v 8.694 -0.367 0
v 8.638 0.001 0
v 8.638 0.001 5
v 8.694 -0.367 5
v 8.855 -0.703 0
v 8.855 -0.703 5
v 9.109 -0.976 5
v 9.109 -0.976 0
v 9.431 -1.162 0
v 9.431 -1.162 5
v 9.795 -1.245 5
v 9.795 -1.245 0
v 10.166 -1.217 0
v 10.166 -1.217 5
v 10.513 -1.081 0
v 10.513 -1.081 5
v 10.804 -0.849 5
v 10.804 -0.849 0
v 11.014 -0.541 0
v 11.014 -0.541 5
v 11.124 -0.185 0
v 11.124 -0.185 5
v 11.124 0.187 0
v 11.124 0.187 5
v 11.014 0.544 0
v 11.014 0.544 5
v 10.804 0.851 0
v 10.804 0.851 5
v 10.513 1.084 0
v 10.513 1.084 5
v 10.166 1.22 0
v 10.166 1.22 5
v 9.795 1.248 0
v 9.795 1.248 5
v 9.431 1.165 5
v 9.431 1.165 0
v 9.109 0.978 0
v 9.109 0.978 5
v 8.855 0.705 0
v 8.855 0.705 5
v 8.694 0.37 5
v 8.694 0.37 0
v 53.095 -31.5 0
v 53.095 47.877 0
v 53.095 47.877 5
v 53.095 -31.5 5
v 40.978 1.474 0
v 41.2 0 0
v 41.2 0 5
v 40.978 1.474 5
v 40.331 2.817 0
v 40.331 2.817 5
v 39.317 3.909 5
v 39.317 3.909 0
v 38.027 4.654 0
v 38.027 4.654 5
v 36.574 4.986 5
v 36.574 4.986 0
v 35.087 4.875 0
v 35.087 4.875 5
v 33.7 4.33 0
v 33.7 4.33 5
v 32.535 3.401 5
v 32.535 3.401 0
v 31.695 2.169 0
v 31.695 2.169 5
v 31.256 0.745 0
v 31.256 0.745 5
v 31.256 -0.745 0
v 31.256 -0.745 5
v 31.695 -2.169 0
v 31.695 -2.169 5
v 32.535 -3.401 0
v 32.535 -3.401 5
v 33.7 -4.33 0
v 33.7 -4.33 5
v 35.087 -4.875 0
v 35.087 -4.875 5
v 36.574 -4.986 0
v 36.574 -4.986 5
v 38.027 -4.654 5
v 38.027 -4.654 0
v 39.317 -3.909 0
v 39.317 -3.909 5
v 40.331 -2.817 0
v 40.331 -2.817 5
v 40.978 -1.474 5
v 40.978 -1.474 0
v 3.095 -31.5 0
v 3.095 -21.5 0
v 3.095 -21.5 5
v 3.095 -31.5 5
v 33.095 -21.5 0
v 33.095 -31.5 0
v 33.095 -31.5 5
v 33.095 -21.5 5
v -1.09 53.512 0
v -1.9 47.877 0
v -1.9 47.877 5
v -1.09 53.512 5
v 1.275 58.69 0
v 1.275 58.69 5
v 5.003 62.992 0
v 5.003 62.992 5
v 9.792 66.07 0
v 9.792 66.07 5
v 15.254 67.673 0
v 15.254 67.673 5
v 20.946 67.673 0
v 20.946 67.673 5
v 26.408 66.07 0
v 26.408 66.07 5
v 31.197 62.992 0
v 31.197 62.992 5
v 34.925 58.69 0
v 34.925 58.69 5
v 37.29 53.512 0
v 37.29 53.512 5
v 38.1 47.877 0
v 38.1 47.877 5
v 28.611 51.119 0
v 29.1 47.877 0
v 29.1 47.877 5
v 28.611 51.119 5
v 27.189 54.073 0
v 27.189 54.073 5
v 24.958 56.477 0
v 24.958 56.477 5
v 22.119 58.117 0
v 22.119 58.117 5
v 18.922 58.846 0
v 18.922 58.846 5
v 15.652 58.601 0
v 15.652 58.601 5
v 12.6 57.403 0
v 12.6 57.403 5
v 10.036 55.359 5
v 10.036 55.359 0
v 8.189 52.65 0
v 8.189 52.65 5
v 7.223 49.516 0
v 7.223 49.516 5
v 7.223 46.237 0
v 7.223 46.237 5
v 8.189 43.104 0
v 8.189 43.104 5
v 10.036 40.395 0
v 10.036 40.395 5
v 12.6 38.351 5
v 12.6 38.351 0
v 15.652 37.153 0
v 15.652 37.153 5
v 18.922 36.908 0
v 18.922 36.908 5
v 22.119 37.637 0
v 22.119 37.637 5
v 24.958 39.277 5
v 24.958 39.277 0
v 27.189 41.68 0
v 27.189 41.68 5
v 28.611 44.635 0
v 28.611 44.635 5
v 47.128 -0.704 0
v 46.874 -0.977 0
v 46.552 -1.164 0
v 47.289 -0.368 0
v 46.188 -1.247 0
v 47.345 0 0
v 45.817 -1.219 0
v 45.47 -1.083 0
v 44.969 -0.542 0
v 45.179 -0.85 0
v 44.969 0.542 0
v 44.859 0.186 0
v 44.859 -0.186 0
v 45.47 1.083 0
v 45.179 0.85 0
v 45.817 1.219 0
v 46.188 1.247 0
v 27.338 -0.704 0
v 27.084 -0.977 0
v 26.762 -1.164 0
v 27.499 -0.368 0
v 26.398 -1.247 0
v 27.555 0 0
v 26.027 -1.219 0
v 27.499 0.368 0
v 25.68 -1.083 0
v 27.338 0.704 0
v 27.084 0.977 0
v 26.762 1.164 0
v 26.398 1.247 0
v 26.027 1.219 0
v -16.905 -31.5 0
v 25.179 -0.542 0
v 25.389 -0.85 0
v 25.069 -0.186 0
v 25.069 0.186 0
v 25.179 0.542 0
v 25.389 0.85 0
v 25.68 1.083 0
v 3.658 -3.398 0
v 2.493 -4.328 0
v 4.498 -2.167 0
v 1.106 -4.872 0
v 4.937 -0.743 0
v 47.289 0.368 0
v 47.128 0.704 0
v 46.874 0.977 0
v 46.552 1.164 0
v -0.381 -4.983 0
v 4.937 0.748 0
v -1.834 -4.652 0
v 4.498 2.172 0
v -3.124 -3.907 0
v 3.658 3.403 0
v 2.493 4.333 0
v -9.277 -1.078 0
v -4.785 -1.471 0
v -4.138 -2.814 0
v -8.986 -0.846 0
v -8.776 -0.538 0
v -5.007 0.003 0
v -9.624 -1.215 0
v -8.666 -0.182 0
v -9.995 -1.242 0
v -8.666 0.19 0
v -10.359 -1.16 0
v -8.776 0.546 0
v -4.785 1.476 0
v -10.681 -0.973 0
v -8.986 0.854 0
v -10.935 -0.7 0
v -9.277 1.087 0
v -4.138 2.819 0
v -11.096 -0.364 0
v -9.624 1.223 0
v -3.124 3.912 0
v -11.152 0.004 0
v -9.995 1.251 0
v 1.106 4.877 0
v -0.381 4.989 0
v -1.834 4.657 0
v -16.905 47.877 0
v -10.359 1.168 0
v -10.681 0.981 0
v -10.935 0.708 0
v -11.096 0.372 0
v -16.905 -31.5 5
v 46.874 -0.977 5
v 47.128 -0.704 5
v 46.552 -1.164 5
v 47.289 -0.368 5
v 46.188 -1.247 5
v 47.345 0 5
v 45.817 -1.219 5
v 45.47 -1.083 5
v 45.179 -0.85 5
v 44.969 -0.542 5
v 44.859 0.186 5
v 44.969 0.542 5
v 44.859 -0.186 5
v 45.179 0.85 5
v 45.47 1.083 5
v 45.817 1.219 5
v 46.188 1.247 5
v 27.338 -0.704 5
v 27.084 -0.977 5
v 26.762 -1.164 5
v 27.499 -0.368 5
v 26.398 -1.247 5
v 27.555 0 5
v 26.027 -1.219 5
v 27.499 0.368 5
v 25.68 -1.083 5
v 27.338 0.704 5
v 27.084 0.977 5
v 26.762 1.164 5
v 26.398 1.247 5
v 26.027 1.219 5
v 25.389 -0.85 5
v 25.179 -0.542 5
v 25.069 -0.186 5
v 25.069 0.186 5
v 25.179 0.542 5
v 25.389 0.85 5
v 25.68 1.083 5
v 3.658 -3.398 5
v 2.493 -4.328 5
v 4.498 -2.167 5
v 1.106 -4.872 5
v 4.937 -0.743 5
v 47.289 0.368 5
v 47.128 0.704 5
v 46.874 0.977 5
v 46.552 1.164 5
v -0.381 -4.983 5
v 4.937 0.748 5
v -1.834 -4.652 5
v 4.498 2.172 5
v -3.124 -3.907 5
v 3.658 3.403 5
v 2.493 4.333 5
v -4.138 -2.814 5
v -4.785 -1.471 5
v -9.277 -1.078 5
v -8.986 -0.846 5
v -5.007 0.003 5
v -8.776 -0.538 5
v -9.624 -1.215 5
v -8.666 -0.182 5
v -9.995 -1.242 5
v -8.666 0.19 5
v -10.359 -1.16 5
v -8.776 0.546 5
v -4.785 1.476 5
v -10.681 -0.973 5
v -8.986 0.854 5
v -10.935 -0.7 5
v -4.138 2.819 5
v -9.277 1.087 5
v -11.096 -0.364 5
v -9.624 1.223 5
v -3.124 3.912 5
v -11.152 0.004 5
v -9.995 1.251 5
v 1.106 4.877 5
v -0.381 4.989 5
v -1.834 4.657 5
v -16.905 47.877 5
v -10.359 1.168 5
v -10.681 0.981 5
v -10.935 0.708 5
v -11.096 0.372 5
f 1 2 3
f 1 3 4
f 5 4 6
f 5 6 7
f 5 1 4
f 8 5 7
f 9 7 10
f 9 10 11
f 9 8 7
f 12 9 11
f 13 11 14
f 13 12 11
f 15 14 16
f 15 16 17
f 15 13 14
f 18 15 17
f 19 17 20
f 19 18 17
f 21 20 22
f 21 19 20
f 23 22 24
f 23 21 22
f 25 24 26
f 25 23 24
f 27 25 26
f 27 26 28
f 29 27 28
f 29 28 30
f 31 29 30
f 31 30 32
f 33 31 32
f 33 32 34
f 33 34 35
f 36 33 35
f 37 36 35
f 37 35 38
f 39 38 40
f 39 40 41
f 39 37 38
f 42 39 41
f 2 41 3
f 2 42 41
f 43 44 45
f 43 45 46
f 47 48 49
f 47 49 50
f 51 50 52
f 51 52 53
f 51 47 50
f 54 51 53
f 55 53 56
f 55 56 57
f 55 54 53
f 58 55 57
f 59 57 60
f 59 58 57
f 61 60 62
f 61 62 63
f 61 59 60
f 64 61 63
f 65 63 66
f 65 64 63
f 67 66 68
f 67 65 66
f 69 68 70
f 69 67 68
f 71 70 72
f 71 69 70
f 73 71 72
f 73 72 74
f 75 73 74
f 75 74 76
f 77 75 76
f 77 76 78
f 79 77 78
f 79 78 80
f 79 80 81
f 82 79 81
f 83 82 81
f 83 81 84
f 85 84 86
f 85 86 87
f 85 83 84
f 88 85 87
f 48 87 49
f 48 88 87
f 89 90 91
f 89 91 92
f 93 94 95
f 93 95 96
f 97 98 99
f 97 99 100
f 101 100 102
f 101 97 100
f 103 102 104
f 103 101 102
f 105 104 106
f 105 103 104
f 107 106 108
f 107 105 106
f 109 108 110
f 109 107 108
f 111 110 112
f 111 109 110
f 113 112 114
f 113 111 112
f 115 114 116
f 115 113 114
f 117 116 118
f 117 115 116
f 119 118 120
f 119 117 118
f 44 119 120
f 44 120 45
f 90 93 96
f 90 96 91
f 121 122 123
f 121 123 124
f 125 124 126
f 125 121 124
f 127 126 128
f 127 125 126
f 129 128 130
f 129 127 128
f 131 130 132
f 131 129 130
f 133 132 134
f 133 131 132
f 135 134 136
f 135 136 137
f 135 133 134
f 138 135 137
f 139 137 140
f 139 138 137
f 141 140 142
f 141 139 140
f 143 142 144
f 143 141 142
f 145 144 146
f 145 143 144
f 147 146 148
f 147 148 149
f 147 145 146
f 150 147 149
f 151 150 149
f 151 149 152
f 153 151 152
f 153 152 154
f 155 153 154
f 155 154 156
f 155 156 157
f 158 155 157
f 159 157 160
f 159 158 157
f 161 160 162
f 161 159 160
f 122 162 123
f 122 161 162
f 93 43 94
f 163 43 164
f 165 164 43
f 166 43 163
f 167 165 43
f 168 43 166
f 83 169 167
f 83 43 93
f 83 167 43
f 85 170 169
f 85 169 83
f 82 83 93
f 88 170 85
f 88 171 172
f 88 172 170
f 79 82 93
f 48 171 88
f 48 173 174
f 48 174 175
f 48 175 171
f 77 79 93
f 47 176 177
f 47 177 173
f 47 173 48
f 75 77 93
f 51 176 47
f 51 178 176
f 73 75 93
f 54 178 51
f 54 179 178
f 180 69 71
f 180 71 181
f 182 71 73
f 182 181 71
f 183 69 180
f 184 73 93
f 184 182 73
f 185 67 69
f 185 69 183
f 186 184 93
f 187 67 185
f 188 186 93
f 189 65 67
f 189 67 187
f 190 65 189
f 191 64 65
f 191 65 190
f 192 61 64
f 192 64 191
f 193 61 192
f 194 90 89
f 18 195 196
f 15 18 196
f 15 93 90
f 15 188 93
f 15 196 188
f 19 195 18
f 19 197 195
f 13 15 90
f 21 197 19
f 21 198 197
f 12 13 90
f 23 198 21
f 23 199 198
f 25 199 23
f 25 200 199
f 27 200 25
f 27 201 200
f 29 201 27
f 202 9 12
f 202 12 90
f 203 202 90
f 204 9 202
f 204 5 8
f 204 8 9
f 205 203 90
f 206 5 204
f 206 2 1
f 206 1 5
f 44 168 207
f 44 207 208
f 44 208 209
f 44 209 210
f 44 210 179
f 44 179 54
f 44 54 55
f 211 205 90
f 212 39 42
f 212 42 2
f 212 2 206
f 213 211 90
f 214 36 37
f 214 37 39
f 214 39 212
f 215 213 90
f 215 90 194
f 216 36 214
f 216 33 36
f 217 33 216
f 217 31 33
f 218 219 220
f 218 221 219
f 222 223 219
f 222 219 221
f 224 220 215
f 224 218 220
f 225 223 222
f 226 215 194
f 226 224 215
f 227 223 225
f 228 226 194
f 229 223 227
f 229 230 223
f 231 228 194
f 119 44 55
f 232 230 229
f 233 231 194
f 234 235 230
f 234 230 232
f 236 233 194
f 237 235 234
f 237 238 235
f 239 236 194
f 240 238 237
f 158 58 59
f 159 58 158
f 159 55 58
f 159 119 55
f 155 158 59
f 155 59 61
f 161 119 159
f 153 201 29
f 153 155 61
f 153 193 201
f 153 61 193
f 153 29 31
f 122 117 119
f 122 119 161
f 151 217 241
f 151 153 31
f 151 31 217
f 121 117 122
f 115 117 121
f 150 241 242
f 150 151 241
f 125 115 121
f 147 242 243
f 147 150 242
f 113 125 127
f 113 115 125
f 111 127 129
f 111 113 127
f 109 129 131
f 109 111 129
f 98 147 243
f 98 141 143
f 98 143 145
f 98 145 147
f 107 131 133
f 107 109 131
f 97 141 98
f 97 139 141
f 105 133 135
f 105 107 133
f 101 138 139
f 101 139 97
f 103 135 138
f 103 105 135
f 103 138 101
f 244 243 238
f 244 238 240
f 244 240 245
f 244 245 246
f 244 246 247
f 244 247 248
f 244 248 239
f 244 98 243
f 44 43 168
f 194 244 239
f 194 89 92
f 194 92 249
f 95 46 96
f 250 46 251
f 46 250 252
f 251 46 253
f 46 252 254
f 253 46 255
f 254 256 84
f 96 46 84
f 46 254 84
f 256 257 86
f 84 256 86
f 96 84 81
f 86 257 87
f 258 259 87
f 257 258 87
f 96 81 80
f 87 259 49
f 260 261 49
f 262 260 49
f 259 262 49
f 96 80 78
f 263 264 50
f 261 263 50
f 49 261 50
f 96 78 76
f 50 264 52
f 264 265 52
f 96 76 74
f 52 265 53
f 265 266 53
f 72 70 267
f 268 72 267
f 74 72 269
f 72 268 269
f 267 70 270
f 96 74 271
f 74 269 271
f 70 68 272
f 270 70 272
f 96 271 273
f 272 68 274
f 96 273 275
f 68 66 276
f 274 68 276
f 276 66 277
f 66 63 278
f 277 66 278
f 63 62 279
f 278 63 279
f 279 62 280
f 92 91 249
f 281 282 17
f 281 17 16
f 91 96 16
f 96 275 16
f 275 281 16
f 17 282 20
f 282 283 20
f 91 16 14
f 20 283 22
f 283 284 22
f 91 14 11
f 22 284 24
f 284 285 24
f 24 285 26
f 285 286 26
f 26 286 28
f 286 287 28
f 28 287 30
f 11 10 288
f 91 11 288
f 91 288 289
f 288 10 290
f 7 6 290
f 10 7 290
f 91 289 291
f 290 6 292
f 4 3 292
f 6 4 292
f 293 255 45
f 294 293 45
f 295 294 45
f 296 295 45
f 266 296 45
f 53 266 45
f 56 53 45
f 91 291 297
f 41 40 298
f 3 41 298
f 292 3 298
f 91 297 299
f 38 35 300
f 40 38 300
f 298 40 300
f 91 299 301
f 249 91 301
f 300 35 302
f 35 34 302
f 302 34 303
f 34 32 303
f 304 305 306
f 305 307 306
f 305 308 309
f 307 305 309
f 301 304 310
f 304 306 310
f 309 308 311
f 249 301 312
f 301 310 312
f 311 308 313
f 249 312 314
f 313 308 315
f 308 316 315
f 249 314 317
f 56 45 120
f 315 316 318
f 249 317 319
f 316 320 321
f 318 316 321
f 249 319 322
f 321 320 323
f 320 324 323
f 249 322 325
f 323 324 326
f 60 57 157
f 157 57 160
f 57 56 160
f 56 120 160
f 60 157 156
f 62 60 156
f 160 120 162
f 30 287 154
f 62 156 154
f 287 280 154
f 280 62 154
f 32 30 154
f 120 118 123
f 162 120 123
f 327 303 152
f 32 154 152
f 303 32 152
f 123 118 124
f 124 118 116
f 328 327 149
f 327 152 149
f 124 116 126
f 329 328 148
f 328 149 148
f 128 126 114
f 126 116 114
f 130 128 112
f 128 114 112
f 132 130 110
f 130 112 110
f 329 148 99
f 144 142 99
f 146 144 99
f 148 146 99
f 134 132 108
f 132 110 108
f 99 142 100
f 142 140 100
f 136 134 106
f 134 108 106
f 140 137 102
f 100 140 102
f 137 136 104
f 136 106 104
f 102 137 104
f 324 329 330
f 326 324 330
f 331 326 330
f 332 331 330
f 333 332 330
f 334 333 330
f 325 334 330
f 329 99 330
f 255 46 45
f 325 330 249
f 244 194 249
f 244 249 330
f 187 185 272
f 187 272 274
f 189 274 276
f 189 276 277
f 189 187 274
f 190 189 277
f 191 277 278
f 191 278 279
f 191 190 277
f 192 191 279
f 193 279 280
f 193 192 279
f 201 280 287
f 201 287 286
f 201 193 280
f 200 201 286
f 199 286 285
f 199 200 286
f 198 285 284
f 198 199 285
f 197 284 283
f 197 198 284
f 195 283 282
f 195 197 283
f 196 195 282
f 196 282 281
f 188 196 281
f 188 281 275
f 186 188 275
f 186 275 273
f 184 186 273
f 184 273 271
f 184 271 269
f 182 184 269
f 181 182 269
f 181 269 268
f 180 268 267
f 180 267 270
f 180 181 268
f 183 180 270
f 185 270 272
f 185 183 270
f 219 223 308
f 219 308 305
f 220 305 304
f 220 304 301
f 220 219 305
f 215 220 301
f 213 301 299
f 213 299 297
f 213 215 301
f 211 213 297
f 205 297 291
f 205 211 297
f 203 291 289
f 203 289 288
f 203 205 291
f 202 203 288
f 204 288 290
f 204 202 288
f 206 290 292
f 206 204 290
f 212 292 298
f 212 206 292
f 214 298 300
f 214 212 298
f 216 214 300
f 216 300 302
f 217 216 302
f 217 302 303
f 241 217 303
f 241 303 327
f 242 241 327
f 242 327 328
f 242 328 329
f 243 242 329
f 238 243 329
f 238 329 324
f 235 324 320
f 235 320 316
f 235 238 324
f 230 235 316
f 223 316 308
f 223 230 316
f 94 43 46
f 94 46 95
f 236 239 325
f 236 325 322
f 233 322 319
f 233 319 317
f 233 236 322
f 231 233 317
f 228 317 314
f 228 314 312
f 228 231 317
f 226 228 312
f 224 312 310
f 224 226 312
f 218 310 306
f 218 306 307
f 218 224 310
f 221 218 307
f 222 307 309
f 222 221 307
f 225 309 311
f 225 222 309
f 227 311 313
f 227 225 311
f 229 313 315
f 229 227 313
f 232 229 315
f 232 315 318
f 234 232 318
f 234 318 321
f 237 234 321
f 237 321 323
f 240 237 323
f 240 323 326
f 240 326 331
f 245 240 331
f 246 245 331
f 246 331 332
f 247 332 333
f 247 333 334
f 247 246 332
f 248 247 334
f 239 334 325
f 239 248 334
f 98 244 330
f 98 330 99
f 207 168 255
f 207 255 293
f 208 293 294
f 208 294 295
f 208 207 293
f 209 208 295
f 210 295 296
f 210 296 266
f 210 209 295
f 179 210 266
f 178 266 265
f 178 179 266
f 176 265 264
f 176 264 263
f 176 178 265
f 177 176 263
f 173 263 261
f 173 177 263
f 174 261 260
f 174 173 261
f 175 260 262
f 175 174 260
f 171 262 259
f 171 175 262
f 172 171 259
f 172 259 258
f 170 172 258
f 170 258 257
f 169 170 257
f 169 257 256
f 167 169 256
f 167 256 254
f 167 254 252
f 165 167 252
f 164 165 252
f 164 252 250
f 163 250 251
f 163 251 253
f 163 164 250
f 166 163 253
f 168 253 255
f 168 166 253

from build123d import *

# Parameters (mm, degrees)
SKETCH1_R           = 11
SKETCH1_R_2         = 1.25
SKETCH1_R_3         = 5
BOSS_EXTRUDE7_DEPTH = 5


with BuildPart() as part:
    # Sketch1 → Boss-Extrude7 (new body)
    with BuildSketch(Plane.XY):
        with BuildLine():
            Line((-16.905, 47.876904679), (-1.9, 47.876904679))
            ThreePointArc((-1.9, 47.876904679), (18.1, 67.876904679), (38.1, 47.876904679))
            Line((38.1, 47.876904679), (53.095, 47.876904679))
            Line((53.095, 47.876904679), (53.095, -21.5))
            Line((53.095, -21.5), (53.095, -31.5))
            Line((53.095, -31.5), (33.095, -31.5))
            Line((33.095, -31.5), (33.095, -21.5))
            Line((33.095, -21.5), (3.095, -21.5))
            Line((3.095, -21.5), (3.095, -31.5))
            Line((3.095, -31.5), (-16.905, -31.5))
            Line((-16.905, -31.5), (-16.905, -21.5))
            Line((-16.905, -21.5), (-16.905, 47.876904679))
        make_face()
        with Locations((18.1, 47.876904679)):
            Circle(SKETCH1_R, mode=Mode.SUBTRACT)
        with Locations((46.095, 0)):
            Circle(SKETCH1_R_2, mode=Mode.SUBTRACT)
        with Locations((36.2, 0)):
            Circle(SKETCH1_R_3, mode=Mode.SUBTRACT)
        with Locations((26.305, 0)):
            Circle(SKETCH1_R_2, mode=Mode.SUBTRACT)
        with Locations(Location((-9.901900695, 0.004035702, 0), (0, 0, 180))):
            Circle(SKETCH1_R_2, mode=Mode.SUBTRACT)
        with Locations(Location((9.888099099, 0.001183168, 0), (0, 0, 180))):
            Circle(SKETCH1_R_2, mode=Mode.SUBTRACT)
        with Locations(Location((-0.006900798, 0.002609435, 0), (0, 0, 180))):
            Circle(SKETCH1_R_3, mode=Mode.SUBTRACT)
    extrude(amount=BOSS_EXTRUDE7_DEPTH)


solid = part.part
